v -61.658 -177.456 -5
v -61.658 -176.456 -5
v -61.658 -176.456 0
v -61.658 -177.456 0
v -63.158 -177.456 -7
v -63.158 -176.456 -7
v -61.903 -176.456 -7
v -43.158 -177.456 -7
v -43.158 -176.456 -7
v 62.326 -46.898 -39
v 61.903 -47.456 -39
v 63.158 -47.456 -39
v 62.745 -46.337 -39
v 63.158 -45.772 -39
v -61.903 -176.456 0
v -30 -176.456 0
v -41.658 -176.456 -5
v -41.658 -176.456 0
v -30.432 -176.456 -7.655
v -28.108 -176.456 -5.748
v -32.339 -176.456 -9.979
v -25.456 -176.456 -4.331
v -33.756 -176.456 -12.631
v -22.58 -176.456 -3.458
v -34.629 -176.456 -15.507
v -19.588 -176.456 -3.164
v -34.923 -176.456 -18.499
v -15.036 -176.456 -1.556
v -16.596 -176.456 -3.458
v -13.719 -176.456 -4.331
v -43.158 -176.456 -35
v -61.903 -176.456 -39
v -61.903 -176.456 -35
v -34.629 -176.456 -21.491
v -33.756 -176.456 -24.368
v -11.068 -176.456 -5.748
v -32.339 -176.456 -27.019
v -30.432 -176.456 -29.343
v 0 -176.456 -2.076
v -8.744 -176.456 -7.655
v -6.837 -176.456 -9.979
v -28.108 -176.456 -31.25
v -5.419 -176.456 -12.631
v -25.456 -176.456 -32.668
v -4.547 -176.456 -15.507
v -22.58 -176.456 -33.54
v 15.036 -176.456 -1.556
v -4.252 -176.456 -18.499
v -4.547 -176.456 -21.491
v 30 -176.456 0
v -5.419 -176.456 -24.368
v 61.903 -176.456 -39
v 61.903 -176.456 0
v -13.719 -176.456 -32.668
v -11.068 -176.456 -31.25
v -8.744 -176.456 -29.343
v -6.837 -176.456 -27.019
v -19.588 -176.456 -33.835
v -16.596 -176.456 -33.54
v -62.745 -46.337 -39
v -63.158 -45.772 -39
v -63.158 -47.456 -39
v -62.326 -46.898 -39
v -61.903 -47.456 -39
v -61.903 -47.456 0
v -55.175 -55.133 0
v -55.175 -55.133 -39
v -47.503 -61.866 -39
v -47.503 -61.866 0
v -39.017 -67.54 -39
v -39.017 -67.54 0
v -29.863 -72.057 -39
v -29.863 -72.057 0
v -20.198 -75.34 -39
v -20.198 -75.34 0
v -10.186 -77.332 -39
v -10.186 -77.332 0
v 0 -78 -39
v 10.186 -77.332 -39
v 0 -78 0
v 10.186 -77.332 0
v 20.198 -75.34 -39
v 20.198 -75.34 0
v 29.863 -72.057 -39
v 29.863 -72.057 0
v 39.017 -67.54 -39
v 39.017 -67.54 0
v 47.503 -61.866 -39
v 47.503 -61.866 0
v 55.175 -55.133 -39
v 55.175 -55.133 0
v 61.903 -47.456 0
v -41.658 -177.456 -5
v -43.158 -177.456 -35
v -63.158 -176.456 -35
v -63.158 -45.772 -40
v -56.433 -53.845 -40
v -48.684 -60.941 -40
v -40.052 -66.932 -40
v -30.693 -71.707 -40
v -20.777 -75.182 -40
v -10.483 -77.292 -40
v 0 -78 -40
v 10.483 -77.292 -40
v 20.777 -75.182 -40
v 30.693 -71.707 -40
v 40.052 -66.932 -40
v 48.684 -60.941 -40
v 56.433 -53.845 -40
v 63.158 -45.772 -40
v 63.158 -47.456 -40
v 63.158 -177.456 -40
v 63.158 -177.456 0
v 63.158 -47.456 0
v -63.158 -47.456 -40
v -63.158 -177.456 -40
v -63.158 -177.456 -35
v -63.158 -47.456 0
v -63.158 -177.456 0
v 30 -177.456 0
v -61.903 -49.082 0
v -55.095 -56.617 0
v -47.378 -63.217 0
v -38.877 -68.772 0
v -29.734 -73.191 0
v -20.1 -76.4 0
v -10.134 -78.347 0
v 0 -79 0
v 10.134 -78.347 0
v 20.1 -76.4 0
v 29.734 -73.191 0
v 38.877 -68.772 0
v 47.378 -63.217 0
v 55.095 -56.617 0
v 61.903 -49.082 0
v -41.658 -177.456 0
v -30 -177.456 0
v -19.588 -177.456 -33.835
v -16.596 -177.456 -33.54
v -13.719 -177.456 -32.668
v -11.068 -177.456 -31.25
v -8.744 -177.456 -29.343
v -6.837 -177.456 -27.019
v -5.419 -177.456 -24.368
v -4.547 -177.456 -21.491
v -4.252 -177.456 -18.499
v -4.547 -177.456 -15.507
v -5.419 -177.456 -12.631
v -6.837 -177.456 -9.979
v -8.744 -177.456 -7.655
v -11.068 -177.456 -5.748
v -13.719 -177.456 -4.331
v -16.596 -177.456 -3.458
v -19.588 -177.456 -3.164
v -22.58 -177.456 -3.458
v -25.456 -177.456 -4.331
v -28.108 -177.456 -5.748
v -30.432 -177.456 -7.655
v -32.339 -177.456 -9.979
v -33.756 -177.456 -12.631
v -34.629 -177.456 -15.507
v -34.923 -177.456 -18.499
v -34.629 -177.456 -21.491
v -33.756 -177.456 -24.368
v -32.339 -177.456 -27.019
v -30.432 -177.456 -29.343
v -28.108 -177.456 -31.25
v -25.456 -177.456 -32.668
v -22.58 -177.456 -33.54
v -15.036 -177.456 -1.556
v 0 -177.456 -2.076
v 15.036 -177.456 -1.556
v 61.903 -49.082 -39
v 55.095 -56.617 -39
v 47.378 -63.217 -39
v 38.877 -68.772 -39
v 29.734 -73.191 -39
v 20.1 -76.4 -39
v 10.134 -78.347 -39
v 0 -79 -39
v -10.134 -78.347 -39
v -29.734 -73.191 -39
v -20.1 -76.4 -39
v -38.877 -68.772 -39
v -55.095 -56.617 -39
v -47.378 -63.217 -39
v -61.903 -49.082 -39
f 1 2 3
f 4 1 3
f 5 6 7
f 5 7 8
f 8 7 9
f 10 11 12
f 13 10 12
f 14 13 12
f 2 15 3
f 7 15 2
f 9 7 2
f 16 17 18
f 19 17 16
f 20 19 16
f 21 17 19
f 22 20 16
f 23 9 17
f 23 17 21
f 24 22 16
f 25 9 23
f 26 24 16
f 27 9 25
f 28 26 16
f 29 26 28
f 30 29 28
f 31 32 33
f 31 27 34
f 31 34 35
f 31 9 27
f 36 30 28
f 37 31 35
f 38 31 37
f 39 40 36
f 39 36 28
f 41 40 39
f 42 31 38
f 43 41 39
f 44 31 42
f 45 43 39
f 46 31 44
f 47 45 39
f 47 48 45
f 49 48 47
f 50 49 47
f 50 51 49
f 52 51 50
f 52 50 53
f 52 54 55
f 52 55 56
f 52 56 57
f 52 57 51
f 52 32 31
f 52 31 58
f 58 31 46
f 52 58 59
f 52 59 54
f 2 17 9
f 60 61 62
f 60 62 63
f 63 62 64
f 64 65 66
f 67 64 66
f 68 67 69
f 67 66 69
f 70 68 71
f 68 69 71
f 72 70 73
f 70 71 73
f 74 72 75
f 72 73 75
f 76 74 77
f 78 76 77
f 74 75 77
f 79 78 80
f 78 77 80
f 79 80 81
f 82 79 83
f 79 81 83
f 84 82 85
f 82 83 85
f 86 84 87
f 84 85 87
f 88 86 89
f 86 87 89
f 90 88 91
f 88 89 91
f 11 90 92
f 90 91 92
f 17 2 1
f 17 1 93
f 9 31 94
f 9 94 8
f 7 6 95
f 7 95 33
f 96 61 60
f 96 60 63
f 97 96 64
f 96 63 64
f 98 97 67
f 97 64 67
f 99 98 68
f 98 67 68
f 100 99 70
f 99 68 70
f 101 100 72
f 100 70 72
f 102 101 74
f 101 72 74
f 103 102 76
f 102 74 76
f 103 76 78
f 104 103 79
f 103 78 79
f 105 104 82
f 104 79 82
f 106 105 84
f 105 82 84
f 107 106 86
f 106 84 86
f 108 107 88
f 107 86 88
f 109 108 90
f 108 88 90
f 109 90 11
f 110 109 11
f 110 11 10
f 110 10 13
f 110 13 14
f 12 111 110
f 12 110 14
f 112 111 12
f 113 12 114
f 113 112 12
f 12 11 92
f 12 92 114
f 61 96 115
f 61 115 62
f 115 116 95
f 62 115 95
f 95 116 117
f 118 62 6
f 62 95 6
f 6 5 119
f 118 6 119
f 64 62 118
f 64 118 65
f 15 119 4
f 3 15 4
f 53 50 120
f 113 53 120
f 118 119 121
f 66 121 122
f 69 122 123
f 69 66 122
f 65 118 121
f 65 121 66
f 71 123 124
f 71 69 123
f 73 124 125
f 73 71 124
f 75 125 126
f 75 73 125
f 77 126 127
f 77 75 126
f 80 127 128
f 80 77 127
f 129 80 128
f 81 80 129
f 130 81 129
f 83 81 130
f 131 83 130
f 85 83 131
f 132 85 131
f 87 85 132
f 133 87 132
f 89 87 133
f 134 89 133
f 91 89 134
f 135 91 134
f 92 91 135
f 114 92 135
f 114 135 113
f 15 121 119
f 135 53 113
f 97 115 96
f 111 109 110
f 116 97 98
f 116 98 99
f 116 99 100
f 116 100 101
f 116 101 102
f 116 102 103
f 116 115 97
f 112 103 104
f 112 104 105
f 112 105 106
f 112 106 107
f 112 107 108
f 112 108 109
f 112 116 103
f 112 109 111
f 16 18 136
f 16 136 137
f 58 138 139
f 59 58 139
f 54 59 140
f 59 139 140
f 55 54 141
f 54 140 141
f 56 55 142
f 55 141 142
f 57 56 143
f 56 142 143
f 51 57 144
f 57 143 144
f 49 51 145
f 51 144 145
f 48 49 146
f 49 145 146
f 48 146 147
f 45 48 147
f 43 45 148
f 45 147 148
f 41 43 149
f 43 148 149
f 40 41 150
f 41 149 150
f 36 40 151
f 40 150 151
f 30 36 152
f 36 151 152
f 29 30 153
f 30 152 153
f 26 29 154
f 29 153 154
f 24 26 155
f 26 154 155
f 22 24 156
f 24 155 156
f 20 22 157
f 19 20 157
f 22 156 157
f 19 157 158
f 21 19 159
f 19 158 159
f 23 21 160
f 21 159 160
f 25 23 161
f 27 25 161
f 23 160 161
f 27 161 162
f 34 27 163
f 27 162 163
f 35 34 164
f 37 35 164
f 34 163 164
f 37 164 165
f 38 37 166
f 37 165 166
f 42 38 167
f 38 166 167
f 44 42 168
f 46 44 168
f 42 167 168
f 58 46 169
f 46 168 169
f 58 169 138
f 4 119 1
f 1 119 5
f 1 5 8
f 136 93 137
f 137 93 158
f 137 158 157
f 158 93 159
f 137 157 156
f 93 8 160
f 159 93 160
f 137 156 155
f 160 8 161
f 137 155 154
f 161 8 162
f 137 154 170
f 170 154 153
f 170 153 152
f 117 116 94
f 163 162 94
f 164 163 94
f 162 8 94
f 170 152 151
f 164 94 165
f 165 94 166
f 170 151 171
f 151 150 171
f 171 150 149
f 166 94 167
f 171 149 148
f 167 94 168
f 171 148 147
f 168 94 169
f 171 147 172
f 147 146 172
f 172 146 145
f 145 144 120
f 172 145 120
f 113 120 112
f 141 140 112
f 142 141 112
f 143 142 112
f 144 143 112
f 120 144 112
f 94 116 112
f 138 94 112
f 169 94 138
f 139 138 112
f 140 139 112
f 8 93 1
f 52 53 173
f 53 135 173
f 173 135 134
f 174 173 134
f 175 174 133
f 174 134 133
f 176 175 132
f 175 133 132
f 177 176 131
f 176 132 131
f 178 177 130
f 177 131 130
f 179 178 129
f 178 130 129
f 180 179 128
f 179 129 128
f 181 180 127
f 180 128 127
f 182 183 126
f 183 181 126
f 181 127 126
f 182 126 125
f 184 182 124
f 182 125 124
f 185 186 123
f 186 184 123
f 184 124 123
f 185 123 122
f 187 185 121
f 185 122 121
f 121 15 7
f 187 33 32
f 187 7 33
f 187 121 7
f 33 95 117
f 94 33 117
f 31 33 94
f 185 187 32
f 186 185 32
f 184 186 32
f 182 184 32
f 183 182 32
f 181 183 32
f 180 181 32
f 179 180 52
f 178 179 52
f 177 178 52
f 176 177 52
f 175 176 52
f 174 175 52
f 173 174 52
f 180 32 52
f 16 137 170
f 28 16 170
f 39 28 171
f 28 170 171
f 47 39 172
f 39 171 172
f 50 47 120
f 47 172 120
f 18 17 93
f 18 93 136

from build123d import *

# Parameters (mm, degrees)
BOSS_EXTRUDE1_DEPTH     = 40
SKETCH3_W               = 1.255387907
SKETCH3_H               = 40
BOSS_EXTRUDE2_DEPTH     = 130
SKETCH4_W               = 126.316334496
SKETCH4_H               = 1
BOSS_EXTRUDE3_DEPTH     = 150
SKETCH5_R               = 78
CUT_EXTRUDE3_DEPTH      = 90
SKETCH6_W               = 126.316334496
SKETCH6_H               = 1
BOSS_EXTRUDE4_DEPTH     = 39
CUT_EXTRUDE4_DEPTH      = 39
CUT_EXTRUDE5_DEPTH      = 152.425375183
CUT_EXTRUDE5_DEPTH_BACK = 1
SKETCH8_W               = 20
SKETCH8_H               = 5
SKETCH8_H_2             = 28
SKETCH9_R               = 15.335640517
CUT_EXTRUDE6_DEPTH      = 1


with BuildPart() as part:
    # Sketch2 → Boss-Extrude1 (new body)
    with BuildSketch(Plane.XY):
        with BuildLine():
            Line((61.902779341, -47.455725786), (63.158167248, -47.455725786))
            ThreePointArc((63.158167248, -47.455725786), (0, -79), (-63.158167248, -47.455725786))
            Line((-63.158167248, -47.455725786), (-61.902779341, -47.455725786))
            ThreePointArc((-61.902779341, -47.455725786), (0, -78), (61.902779341, -47.455725786))
        make_face()
    extrude(amount=-BOSS_EXTRUDE1_DEPTH)

    # Sketch3 → Boss-Extrude2 (add)
    with BuildSketch(Plane(origin=(0, -47.455725786, 0), x_dir=(1, 0, 0), z_dir=(0, 1, 0))):
        with Locations((-62.530473295, 20)):
            Rectangle(SKETCH3_W, SKETCH3_H)
        with Locations((62.530473295, 20)):
            Rectangle(SKETCH3_W, SKETCH3_H)
    extrude(amount=-BOSS_EXTRUDE2_DEPTH)

    # Sketch4 → Boss-Extrude3 (add)
    with BuildSketch(Plane.XZ.offset(177.455725786)):
        with Locations((0, -39.5)):
            Rectangle(SKETCH4_W, SKETCH4_H)
    extrude(amount=-BOSS_EXTRUDE3_DEPTH)

    # Sketch5 → Cut-Extrude3 (cut)
    with BuildSketch(Plane.XY.offset(-39)):
        Circle(SKETCH5_R)
    extrude(amount=-CUT_EXTRUDE3_DEPTH, mode=Mode.SUBTRACT)

    # Sketch6 → Boss-Extrude4 (add)
    with BuildSketch(Plane.XY.offset(-39)):
        with Locations((0, -176.955725786)):
            Rectangle(SKETCH6_W, SKETCH6_H)
    extrude(amount=BOSS_EXTRUDE4_DEPTH)

    # Sketch7 → Cut-Extrude4 (cut)
    with BuildSketch(Plane.XZ.offset(177.455725786)):
        with BuildLine():
            Line((0, 0), (-30, 0))
            ThreePointArc((-30, 0), (0, -2.075596442), (30, 0))
            Line((30, 0), (0, 0))
        make_face()
    extrude(amount=-CUT_EXTRUDE4_DEPTH, mode=Mode.SUBTRACT)

    # Sketch8 → Cut-Extrude5 (cut, two sides: drawn at the far end of the back side and taken through both)
    with BuildSketch(Plane.XZ.offset(177.455725786).offset(-CUT_EXTRUDE5_DEPTH_BACK)):
        with Locations((-51.658167248, -2.5)):
            Rectangle(SKETCH8_W, SKETCH8_H)
        with Locations((-53.158167248, -21)):
            Rectangle(SKETCH8_W, SKETCH8_H_2)
    extrude(amount=CUT_EXTRUDE5_DEPTH + CUT_EXTRUDE5_DEPTH_BACK, mode=Mode.SUBTRACT)

    # Sketch9 → Cut-Extrude6 (cut)
    with BuildSketch(Plane.XZ.offset(177.455725786)):
        with Locations(Location((-19.587676617, -18.499331227, 0), (0, 0, 270))):
            Circle(SKETCH9_R)
    extrude(amount=-CUT_EXTRUDE6_DEPTH, mode=Mode.SUBTRACT)


solid = part.part
